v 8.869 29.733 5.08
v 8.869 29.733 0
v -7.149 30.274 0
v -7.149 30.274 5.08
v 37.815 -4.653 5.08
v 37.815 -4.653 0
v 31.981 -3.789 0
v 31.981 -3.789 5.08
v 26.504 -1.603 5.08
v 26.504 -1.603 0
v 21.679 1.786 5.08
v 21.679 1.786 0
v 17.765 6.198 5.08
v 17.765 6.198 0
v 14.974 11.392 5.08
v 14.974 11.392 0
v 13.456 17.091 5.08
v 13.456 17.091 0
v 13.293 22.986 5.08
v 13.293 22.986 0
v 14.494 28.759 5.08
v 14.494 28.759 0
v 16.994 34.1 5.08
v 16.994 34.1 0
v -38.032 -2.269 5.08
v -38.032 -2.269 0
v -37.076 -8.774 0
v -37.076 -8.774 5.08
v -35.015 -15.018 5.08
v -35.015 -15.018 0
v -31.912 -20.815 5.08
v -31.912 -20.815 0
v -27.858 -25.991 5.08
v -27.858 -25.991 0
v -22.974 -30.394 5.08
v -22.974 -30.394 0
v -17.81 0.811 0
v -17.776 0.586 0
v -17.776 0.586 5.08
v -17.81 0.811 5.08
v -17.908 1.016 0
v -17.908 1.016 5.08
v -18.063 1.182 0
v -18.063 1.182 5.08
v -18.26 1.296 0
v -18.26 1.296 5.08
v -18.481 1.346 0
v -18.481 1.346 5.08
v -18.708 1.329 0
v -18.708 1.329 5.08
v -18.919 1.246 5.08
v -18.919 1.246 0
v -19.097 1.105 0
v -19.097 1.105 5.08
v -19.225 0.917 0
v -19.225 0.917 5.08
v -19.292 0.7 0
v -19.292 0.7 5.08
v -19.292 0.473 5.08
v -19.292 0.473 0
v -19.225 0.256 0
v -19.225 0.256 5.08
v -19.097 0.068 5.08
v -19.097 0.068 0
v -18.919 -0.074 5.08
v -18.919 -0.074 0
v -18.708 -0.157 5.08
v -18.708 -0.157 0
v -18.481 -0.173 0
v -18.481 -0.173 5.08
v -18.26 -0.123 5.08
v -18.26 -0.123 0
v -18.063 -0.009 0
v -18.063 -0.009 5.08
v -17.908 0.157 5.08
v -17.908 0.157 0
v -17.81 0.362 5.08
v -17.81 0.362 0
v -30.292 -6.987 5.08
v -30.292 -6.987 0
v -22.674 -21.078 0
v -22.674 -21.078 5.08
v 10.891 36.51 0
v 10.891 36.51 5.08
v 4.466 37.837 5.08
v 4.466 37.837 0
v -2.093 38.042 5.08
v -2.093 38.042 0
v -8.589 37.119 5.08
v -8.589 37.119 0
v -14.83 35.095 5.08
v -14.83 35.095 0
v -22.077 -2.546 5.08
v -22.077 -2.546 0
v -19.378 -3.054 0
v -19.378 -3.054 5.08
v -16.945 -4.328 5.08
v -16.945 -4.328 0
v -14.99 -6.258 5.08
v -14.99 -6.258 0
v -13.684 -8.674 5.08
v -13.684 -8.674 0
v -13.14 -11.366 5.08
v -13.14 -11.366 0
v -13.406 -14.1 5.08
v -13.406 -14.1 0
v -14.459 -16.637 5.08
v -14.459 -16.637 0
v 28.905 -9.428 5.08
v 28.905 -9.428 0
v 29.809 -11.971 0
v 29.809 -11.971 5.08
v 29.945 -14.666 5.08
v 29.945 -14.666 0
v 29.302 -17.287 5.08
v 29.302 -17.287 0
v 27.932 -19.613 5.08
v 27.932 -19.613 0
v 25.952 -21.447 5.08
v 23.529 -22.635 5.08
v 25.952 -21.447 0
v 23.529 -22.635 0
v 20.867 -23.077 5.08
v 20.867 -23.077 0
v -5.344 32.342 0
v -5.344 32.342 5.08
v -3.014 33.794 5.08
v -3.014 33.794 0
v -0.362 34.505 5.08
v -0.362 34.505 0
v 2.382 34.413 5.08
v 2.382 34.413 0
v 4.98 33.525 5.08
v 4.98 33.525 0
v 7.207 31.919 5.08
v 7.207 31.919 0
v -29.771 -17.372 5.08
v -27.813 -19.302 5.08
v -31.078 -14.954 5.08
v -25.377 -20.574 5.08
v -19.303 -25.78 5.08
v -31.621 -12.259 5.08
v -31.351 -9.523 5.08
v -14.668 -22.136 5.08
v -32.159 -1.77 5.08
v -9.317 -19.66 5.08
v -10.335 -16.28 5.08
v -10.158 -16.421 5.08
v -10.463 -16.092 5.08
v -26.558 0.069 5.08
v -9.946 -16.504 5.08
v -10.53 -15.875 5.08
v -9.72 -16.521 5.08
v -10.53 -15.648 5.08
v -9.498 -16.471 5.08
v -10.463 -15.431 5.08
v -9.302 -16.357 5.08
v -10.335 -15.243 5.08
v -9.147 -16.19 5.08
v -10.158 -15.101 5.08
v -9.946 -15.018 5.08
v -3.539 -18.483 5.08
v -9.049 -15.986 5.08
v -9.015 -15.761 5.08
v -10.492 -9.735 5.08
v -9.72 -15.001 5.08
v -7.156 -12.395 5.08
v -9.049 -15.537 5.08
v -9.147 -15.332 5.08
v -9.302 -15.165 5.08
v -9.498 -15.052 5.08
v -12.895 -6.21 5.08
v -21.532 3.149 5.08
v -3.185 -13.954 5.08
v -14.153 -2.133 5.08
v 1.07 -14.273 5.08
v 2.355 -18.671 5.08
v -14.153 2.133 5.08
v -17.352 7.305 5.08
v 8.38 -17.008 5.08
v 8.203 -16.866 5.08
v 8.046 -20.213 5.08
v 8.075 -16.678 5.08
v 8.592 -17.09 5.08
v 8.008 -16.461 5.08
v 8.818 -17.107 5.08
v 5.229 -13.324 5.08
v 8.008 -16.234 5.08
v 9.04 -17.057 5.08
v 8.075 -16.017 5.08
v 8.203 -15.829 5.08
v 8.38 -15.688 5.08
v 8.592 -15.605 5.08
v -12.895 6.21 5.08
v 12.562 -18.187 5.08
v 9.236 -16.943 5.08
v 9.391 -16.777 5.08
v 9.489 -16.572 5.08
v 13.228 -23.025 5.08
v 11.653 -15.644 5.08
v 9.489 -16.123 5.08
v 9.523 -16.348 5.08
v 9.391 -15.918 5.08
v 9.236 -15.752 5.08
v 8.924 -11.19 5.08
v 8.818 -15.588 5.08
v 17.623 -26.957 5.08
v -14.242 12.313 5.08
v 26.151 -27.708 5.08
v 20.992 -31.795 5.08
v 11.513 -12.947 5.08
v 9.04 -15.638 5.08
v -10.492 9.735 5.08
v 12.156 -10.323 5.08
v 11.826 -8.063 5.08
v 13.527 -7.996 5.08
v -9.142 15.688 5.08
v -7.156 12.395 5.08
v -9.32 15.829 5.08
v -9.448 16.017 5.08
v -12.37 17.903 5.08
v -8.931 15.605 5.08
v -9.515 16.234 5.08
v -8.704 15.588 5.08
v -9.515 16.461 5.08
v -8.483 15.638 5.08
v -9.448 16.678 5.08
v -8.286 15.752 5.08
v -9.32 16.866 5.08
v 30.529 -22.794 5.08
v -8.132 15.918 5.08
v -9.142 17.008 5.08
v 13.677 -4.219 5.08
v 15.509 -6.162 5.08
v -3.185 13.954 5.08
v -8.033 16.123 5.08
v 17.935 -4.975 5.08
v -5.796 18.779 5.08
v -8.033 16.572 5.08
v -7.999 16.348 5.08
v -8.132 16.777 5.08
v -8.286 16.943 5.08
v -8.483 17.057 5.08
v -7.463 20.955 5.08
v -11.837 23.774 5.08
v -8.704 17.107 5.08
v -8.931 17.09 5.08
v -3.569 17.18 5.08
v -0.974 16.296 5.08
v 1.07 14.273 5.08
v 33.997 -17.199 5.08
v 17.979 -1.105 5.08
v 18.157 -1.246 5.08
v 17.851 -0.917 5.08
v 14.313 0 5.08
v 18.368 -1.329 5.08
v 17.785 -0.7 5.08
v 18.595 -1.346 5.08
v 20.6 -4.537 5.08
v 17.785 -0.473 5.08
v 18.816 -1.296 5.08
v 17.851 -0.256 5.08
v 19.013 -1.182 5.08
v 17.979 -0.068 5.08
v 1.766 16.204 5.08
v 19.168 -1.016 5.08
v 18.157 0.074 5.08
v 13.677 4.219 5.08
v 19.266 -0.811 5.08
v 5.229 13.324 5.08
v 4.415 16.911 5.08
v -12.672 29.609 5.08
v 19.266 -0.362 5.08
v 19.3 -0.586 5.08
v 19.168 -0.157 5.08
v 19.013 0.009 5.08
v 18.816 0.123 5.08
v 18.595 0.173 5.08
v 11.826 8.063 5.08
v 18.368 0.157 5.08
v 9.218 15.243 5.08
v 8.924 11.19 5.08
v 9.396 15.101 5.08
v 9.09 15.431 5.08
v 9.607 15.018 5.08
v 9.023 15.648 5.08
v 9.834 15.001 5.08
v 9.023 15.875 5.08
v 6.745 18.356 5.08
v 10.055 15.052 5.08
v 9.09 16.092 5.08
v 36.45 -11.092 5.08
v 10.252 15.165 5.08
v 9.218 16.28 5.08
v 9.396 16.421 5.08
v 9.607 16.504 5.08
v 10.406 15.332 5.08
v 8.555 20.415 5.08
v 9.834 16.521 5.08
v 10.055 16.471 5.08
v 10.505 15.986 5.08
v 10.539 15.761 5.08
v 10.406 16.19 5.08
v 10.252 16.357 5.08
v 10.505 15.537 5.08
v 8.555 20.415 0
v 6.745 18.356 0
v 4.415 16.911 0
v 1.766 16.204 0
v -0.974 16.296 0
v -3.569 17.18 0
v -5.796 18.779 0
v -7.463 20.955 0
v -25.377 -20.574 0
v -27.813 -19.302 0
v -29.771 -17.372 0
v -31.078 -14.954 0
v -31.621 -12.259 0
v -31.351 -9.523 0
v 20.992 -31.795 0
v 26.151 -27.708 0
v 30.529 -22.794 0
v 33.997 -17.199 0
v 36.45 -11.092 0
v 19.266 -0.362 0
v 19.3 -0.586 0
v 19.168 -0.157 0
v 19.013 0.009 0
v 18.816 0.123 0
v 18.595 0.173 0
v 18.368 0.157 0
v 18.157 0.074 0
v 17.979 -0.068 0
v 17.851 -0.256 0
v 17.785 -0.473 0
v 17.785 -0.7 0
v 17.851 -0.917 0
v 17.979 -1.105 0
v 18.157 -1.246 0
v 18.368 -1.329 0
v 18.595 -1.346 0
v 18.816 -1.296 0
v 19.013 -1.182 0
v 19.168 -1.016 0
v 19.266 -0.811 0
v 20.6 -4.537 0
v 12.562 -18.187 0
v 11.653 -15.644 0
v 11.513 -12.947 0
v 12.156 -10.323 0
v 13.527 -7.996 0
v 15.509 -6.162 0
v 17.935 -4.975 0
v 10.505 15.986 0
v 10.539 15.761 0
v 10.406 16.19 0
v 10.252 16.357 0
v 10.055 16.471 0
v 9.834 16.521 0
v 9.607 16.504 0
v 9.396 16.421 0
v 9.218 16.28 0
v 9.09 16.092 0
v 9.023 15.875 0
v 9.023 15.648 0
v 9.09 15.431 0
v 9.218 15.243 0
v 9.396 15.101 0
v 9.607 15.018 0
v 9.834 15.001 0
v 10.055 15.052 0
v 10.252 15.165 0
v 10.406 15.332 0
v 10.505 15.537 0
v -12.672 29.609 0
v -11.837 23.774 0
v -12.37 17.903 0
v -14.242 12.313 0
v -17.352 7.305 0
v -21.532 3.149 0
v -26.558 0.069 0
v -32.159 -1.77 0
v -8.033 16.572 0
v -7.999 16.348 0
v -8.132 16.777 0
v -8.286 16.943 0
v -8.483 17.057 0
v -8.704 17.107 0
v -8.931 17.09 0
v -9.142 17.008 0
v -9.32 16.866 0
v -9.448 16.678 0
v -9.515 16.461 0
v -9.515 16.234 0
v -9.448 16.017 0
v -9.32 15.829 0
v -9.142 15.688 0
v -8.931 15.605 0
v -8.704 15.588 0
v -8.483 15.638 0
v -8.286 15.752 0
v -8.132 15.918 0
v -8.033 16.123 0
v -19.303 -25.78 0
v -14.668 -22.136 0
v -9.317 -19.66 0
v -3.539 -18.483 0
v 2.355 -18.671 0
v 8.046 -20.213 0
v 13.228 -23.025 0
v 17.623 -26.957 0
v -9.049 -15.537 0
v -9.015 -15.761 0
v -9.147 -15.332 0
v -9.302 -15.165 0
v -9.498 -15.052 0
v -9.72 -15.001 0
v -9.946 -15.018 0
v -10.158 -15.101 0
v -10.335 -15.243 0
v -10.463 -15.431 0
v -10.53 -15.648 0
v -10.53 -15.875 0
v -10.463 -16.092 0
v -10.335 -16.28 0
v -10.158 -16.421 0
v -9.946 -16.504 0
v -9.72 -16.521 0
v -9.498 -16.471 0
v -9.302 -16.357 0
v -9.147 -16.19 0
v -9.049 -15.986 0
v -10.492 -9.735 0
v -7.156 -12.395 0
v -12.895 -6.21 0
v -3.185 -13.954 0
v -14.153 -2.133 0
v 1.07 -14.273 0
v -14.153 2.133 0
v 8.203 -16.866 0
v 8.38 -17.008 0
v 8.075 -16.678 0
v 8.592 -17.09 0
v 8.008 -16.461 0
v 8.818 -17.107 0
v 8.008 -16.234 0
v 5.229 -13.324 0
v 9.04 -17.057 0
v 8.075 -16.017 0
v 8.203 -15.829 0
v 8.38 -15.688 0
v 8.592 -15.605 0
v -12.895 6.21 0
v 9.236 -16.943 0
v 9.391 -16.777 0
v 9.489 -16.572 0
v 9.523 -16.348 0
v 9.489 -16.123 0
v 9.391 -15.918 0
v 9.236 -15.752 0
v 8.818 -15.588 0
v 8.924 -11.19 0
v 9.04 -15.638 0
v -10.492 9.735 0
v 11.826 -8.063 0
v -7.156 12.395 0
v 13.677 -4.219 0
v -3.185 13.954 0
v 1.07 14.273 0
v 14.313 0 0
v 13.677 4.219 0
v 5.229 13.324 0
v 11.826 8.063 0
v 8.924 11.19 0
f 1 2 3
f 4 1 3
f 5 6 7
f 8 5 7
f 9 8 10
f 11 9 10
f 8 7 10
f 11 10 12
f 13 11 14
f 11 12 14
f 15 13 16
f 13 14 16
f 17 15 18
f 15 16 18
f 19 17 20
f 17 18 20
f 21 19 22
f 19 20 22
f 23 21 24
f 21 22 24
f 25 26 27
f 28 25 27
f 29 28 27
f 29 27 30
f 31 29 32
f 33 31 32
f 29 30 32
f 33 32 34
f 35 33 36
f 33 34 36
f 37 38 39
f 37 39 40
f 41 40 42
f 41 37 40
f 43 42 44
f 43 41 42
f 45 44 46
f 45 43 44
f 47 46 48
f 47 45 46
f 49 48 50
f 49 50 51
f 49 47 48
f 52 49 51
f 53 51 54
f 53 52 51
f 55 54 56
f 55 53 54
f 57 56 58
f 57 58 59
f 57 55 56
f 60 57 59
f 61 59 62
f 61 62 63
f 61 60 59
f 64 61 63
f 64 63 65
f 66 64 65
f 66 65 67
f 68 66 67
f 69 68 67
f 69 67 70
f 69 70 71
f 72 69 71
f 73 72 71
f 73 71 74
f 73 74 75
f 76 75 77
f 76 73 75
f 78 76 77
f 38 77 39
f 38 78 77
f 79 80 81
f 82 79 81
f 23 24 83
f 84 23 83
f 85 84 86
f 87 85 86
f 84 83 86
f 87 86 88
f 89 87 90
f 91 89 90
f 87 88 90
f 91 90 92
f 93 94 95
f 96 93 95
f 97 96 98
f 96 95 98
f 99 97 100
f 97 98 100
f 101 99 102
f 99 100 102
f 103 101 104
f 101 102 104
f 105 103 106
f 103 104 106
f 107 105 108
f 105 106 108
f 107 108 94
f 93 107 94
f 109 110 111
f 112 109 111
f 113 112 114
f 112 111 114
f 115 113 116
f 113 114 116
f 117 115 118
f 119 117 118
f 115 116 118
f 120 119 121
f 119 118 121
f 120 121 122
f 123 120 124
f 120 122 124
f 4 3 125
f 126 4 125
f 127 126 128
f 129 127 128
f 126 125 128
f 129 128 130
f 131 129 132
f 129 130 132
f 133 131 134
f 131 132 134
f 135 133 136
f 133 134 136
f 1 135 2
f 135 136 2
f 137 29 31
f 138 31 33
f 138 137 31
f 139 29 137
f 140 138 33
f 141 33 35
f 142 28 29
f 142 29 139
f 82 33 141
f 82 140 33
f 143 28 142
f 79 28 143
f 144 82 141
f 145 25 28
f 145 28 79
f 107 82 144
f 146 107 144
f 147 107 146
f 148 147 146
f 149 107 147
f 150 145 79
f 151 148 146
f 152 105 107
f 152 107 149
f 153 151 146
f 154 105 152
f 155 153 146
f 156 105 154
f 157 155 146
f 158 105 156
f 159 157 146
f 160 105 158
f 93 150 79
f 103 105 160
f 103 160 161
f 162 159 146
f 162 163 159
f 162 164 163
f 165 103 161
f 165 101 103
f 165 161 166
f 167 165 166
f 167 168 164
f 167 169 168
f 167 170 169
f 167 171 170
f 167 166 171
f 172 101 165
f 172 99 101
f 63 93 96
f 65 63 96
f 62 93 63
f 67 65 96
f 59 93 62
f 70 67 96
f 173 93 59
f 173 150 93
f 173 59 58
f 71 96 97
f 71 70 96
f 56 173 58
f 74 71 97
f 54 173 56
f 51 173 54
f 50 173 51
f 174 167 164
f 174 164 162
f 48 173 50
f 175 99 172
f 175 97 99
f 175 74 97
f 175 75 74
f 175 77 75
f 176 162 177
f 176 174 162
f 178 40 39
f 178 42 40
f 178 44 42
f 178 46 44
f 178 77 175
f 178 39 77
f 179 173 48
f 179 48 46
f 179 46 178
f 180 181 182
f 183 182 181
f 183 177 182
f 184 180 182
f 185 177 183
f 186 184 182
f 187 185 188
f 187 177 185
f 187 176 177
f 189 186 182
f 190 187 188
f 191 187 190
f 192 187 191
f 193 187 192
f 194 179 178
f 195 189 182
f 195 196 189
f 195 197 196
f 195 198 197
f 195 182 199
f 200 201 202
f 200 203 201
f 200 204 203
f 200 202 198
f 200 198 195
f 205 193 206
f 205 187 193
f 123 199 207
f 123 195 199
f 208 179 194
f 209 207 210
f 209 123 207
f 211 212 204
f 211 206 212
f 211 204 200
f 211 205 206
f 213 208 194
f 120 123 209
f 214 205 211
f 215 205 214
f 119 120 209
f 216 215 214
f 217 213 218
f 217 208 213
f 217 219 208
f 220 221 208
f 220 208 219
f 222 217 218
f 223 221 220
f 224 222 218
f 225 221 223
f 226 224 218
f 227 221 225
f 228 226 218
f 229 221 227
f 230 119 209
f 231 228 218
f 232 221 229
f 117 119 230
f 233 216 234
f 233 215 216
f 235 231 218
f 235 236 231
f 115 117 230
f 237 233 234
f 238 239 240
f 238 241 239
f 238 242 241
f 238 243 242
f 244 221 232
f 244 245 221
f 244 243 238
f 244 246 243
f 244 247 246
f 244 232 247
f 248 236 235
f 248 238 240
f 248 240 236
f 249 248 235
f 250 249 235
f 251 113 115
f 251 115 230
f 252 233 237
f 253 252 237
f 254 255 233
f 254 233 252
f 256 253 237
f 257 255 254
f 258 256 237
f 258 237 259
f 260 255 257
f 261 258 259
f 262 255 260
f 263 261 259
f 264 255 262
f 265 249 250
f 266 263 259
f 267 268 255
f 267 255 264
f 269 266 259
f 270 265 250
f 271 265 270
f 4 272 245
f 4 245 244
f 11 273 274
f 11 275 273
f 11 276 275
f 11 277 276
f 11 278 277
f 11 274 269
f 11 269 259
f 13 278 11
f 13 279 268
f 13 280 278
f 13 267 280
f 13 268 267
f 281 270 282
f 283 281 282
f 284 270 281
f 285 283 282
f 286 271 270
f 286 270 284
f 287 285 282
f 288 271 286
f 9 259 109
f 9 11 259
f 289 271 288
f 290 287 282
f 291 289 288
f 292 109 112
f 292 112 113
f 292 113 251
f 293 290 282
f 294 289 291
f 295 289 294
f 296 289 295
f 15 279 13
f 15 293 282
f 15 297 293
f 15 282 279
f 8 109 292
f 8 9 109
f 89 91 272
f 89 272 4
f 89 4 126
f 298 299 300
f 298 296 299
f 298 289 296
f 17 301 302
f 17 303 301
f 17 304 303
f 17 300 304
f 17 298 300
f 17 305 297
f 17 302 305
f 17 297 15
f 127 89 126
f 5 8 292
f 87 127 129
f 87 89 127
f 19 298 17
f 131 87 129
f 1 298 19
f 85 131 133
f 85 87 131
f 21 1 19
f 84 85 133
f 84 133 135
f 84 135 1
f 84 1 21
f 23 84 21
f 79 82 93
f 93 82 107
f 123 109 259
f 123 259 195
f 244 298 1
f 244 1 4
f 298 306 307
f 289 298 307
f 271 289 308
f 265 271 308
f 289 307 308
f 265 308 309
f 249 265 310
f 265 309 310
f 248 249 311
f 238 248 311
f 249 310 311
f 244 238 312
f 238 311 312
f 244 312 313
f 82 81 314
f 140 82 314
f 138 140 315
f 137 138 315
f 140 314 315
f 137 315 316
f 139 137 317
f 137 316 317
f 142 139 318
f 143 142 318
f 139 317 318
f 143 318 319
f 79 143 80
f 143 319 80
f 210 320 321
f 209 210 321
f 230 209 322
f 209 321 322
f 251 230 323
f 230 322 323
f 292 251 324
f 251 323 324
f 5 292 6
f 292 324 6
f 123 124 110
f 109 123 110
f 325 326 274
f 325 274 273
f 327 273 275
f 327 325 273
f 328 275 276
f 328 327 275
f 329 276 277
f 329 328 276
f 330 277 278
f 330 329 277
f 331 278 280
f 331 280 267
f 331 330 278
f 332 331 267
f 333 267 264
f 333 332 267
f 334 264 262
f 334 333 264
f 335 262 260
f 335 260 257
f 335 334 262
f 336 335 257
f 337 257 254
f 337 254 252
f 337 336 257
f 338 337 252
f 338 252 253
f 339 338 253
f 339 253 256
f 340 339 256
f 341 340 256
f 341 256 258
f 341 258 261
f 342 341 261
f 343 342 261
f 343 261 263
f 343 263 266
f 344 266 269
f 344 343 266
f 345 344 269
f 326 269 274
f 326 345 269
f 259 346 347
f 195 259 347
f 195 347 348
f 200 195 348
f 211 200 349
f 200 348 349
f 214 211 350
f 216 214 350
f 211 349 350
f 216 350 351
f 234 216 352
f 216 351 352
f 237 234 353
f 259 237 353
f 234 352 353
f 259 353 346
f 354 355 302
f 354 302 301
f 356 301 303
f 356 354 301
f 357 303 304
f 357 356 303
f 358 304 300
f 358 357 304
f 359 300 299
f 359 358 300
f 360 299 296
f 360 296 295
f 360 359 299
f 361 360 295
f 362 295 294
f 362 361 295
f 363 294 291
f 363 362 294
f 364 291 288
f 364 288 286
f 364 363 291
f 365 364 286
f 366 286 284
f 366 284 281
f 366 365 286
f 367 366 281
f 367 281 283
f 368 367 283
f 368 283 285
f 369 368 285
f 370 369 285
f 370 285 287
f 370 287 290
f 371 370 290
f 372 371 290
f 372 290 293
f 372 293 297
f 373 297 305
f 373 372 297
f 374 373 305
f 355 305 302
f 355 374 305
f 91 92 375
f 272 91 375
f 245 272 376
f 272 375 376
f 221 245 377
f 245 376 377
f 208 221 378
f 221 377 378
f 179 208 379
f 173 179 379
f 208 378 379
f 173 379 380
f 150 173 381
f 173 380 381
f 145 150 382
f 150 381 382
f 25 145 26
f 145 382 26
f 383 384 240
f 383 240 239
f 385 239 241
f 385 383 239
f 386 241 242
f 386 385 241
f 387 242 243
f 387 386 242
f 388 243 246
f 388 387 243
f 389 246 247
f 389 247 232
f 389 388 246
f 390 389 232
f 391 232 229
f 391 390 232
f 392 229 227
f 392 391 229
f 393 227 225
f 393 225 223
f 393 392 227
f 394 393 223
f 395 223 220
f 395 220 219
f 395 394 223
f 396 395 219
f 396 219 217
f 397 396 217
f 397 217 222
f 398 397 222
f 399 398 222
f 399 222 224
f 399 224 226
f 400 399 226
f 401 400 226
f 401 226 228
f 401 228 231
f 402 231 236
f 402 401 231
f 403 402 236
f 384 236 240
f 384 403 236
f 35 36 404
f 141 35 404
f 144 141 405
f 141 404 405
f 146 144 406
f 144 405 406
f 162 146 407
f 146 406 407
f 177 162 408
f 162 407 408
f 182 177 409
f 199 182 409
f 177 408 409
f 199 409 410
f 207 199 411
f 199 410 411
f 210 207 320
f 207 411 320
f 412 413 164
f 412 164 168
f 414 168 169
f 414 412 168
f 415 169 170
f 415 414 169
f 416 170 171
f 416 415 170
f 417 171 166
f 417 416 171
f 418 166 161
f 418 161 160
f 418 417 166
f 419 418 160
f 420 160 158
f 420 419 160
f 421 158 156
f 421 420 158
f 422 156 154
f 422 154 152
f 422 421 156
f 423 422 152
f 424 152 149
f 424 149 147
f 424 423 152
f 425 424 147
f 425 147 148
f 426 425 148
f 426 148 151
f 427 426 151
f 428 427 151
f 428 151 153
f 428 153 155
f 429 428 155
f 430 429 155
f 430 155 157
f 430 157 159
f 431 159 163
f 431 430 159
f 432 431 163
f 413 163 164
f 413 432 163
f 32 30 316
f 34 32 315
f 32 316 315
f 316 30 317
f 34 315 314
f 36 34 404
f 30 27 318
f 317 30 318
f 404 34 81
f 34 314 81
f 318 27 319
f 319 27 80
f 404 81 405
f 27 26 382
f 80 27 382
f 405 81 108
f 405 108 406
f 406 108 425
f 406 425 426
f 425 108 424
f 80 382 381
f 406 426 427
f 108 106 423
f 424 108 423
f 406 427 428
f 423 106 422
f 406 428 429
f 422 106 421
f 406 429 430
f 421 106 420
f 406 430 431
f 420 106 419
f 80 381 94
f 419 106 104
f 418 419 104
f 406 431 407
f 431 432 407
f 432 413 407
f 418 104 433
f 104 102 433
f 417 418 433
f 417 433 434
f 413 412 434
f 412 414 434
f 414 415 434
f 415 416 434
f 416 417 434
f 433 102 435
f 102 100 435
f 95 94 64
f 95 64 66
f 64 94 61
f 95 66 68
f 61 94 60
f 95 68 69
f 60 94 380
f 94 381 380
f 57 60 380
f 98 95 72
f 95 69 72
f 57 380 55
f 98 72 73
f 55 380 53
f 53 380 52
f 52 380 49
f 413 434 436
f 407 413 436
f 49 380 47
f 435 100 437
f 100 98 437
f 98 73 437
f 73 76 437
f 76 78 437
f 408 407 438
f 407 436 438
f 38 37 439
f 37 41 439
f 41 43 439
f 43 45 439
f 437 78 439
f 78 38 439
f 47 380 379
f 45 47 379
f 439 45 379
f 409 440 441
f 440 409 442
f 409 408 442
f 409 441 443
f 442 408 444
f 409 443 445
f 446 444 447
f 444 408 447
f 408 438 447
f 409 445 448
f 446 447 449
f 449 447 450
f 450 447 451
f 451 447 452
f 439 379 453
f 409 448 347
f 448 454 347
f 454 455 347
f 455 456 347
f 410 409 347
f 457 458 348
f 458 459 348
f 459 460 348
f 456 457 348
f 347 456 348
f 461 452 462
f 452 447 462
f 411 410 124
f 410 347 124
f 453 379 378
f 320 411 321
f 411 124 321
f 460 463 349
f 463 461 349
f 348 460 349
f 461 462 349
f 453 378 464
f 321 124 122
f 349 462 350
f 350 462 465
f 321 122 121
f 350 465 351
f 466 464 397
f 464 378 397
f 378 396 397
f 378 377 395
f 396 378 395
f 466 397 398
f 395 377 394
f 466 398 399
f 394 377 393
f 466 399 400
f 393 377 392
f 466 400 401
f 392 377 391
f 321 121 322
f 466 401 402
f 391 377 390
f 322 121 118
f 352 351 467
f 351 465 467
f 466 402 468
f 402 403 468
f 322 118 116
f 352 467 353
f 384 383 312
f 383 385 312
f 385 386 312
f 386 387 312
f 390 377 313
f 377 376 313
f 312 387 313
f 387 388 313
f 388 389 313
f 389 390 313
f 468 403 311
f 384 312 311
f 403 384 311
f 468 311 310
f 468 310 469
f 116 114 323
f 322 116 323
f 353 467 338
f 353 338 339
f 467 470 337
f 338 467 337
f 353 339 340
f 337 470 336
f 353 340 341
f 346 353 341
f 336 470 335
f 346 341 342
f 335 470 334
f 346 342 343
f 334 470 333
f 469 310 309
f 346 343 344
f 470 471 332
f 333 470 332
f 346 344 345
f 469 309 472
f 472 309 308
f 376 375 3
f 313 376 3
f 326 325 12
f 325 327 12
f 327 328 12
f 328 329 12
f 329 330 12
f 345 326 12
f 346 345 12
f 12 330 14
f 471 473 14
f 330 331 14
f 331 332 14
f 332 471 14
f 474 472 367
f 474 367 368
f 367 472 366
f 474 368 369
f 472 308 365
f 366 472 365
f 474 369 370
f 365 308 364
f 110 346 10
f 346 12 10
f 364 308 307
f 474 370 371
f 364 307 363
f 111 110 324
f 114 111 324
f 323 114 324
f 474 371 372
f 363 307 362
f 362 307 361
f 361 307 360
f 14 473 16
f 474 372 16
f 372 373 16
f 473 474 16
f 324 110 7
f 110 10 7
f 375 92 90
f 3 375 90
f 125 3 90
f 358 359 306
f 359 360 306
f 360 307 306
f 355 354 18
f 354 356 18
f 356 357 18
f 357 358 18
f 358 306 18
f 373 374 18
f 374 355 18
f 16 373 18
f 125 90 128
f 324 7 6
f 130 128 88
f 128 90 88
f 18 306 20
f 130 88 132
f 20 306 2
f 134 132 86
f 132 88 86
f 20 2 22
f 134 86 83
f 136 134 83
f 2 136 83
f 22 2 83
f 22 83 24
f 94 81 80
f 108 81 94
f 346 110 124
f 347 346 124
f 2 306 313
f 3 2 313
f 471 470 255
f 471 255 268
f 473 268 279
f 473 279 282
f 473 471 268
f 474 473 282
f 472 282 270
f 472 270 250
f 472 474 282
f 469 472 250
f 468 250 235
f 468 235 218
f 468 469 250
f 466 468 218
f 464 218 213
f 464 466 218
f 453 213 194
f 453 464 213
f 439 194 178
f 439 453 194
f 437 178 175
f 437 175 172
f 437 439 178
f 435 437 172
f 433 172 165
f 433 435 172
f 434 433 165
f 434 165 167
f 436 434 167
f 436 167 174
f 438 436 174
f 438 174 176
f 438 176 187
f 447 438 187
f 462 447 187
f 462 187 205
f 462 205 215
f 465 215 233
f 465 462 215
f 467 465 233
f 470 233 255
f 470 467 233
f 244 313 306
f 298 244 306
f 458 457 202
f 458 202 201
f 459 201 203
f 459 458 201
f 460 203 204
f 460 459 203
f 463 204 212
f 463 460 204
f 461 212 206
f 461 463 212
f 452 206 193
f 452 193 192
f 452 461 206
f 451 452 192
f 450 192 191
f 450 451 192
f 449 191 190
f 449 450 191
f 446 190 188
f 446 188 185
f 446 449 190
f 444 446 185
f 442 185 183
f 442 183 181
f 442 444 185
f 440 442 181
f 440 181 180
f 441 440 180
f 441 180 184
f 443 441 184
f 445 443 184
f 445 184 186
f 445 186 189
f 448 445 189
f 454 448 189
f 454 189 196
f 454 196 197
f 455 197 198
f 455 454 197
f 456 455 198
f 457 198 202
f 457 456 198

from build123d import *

# Parameters (mm, degrees)
F0_R     = 0.762
F0_R_2   = 14.3129
F1_DEPTH = 5.08


with BuildPart() as f1:
    # F0 (on Top) → F1 (new body)
    with BuildSketch(Plane.XY):
        with BuildLine():
            ThreePointArc((37.814819, -4.652899), (16.218364, 8.71367), (16.993927, 34.100094))
            ThreePointArc((16.993927, 34.100094), (1.190918, 38.081383), (-14.829981, 35.095322))
            ThreePointArc((-14.829981, 35.095322), (-15.650884, 9.718876), (-38.032383, -2.268884))
            ThreePointArc((-38.032383, -2.268884), (-33.588812, -17.983373), (-22.974289, -30.393948))
            ThreePointArc((-22.974289, -30.393948), (-0.586685, -18.405835), (20.992008, -31.795371))
            ThreePointArc((20.992008, -31.795371), (32.384242, -20.071643), (37.814819, -4.652899))
        make_face()
        with BuildLine():
            ThreePointArc((-22.674204, -21.077907), (-30.514378, -16.211576), (-30.292149, -6.986604))
            Line((-30.292149, -6.986604), (-22.674204, -21.077907))
        make_face(mode=Mode.SUBTRACT)
        with Locations((-9.776836, -15.761217)):
            Circle(F0_R, mode=Mode.SUBTRACT)
        with BuildLine():
            ThreePointArc((-22.077247, -2.545519), (-14.247146, -7.417295), (-14.459302, -16.636821))
            Line((-14.459302, -16.636821), (-22.077247, -2.545519))
        make_face(mode=Mode.SUBTRACT)
        with Locations((8.761197, -16.347597)):
            Circle(F0_R, mode=Mode.SUBTRACT)
        with BuildLine():
            ThreePointArc((12.561953, -18.186712), (12.756508, -9.109725), (20.600149, -4.537325))
            Line((20.600149, -4.537325), (12.561953, -18.186712))
        make_face(mode=Mode.SUBTRACT)
        with Locations((18.538033, -0.58638)):
            Circle(F0_R, mode=Mode.SUBTRACT)
        with BuildLine():
            Line((20.866679, -23.077409), (28.904875, -9.428021))
            ThreePointArc((28.904875, -9.428021), (28.701601, -18.499874), (20.866679, -23.077409))
        make_face(mode=Mode.SUBTRACT)
        with Locations((-18.538033, 0.58638)):
            Circle(F0_R, mode=Mode.SUBTRACT)
        with Locations((-8.761197, 16.347597)):
            Circle(F0_R, mode=Mode.SUBTRACT)
        Circle(F0_R_2, mode=Mode.SUBTRACT)
        with BuildLine():
            ThreePointArc((8.55484, 20.415134), (0.392702, 16.148838), (-7.463453, 20.955355))
            Line((-7.463453, 20.955355), (8.55484, 20.415134))
        make_face(mode=Mode.SUBTRACT)
        with Locations((9.776836, 15.761217)):
            Circle(F0_R, mode=Mode.SUBTRACT)
        with BuildLine():
            Line((8.8691, 29.733366), (-7.149193, 30.273587))
            ThreePointArc((-7.149193, 30.273587), (1.013642, 34.560545), (8.8691, 29.733366))
        make_face(mode=Mode.SUBTRACT)
    extrude(amount=F1_DEPTH)


solid = f1.part
